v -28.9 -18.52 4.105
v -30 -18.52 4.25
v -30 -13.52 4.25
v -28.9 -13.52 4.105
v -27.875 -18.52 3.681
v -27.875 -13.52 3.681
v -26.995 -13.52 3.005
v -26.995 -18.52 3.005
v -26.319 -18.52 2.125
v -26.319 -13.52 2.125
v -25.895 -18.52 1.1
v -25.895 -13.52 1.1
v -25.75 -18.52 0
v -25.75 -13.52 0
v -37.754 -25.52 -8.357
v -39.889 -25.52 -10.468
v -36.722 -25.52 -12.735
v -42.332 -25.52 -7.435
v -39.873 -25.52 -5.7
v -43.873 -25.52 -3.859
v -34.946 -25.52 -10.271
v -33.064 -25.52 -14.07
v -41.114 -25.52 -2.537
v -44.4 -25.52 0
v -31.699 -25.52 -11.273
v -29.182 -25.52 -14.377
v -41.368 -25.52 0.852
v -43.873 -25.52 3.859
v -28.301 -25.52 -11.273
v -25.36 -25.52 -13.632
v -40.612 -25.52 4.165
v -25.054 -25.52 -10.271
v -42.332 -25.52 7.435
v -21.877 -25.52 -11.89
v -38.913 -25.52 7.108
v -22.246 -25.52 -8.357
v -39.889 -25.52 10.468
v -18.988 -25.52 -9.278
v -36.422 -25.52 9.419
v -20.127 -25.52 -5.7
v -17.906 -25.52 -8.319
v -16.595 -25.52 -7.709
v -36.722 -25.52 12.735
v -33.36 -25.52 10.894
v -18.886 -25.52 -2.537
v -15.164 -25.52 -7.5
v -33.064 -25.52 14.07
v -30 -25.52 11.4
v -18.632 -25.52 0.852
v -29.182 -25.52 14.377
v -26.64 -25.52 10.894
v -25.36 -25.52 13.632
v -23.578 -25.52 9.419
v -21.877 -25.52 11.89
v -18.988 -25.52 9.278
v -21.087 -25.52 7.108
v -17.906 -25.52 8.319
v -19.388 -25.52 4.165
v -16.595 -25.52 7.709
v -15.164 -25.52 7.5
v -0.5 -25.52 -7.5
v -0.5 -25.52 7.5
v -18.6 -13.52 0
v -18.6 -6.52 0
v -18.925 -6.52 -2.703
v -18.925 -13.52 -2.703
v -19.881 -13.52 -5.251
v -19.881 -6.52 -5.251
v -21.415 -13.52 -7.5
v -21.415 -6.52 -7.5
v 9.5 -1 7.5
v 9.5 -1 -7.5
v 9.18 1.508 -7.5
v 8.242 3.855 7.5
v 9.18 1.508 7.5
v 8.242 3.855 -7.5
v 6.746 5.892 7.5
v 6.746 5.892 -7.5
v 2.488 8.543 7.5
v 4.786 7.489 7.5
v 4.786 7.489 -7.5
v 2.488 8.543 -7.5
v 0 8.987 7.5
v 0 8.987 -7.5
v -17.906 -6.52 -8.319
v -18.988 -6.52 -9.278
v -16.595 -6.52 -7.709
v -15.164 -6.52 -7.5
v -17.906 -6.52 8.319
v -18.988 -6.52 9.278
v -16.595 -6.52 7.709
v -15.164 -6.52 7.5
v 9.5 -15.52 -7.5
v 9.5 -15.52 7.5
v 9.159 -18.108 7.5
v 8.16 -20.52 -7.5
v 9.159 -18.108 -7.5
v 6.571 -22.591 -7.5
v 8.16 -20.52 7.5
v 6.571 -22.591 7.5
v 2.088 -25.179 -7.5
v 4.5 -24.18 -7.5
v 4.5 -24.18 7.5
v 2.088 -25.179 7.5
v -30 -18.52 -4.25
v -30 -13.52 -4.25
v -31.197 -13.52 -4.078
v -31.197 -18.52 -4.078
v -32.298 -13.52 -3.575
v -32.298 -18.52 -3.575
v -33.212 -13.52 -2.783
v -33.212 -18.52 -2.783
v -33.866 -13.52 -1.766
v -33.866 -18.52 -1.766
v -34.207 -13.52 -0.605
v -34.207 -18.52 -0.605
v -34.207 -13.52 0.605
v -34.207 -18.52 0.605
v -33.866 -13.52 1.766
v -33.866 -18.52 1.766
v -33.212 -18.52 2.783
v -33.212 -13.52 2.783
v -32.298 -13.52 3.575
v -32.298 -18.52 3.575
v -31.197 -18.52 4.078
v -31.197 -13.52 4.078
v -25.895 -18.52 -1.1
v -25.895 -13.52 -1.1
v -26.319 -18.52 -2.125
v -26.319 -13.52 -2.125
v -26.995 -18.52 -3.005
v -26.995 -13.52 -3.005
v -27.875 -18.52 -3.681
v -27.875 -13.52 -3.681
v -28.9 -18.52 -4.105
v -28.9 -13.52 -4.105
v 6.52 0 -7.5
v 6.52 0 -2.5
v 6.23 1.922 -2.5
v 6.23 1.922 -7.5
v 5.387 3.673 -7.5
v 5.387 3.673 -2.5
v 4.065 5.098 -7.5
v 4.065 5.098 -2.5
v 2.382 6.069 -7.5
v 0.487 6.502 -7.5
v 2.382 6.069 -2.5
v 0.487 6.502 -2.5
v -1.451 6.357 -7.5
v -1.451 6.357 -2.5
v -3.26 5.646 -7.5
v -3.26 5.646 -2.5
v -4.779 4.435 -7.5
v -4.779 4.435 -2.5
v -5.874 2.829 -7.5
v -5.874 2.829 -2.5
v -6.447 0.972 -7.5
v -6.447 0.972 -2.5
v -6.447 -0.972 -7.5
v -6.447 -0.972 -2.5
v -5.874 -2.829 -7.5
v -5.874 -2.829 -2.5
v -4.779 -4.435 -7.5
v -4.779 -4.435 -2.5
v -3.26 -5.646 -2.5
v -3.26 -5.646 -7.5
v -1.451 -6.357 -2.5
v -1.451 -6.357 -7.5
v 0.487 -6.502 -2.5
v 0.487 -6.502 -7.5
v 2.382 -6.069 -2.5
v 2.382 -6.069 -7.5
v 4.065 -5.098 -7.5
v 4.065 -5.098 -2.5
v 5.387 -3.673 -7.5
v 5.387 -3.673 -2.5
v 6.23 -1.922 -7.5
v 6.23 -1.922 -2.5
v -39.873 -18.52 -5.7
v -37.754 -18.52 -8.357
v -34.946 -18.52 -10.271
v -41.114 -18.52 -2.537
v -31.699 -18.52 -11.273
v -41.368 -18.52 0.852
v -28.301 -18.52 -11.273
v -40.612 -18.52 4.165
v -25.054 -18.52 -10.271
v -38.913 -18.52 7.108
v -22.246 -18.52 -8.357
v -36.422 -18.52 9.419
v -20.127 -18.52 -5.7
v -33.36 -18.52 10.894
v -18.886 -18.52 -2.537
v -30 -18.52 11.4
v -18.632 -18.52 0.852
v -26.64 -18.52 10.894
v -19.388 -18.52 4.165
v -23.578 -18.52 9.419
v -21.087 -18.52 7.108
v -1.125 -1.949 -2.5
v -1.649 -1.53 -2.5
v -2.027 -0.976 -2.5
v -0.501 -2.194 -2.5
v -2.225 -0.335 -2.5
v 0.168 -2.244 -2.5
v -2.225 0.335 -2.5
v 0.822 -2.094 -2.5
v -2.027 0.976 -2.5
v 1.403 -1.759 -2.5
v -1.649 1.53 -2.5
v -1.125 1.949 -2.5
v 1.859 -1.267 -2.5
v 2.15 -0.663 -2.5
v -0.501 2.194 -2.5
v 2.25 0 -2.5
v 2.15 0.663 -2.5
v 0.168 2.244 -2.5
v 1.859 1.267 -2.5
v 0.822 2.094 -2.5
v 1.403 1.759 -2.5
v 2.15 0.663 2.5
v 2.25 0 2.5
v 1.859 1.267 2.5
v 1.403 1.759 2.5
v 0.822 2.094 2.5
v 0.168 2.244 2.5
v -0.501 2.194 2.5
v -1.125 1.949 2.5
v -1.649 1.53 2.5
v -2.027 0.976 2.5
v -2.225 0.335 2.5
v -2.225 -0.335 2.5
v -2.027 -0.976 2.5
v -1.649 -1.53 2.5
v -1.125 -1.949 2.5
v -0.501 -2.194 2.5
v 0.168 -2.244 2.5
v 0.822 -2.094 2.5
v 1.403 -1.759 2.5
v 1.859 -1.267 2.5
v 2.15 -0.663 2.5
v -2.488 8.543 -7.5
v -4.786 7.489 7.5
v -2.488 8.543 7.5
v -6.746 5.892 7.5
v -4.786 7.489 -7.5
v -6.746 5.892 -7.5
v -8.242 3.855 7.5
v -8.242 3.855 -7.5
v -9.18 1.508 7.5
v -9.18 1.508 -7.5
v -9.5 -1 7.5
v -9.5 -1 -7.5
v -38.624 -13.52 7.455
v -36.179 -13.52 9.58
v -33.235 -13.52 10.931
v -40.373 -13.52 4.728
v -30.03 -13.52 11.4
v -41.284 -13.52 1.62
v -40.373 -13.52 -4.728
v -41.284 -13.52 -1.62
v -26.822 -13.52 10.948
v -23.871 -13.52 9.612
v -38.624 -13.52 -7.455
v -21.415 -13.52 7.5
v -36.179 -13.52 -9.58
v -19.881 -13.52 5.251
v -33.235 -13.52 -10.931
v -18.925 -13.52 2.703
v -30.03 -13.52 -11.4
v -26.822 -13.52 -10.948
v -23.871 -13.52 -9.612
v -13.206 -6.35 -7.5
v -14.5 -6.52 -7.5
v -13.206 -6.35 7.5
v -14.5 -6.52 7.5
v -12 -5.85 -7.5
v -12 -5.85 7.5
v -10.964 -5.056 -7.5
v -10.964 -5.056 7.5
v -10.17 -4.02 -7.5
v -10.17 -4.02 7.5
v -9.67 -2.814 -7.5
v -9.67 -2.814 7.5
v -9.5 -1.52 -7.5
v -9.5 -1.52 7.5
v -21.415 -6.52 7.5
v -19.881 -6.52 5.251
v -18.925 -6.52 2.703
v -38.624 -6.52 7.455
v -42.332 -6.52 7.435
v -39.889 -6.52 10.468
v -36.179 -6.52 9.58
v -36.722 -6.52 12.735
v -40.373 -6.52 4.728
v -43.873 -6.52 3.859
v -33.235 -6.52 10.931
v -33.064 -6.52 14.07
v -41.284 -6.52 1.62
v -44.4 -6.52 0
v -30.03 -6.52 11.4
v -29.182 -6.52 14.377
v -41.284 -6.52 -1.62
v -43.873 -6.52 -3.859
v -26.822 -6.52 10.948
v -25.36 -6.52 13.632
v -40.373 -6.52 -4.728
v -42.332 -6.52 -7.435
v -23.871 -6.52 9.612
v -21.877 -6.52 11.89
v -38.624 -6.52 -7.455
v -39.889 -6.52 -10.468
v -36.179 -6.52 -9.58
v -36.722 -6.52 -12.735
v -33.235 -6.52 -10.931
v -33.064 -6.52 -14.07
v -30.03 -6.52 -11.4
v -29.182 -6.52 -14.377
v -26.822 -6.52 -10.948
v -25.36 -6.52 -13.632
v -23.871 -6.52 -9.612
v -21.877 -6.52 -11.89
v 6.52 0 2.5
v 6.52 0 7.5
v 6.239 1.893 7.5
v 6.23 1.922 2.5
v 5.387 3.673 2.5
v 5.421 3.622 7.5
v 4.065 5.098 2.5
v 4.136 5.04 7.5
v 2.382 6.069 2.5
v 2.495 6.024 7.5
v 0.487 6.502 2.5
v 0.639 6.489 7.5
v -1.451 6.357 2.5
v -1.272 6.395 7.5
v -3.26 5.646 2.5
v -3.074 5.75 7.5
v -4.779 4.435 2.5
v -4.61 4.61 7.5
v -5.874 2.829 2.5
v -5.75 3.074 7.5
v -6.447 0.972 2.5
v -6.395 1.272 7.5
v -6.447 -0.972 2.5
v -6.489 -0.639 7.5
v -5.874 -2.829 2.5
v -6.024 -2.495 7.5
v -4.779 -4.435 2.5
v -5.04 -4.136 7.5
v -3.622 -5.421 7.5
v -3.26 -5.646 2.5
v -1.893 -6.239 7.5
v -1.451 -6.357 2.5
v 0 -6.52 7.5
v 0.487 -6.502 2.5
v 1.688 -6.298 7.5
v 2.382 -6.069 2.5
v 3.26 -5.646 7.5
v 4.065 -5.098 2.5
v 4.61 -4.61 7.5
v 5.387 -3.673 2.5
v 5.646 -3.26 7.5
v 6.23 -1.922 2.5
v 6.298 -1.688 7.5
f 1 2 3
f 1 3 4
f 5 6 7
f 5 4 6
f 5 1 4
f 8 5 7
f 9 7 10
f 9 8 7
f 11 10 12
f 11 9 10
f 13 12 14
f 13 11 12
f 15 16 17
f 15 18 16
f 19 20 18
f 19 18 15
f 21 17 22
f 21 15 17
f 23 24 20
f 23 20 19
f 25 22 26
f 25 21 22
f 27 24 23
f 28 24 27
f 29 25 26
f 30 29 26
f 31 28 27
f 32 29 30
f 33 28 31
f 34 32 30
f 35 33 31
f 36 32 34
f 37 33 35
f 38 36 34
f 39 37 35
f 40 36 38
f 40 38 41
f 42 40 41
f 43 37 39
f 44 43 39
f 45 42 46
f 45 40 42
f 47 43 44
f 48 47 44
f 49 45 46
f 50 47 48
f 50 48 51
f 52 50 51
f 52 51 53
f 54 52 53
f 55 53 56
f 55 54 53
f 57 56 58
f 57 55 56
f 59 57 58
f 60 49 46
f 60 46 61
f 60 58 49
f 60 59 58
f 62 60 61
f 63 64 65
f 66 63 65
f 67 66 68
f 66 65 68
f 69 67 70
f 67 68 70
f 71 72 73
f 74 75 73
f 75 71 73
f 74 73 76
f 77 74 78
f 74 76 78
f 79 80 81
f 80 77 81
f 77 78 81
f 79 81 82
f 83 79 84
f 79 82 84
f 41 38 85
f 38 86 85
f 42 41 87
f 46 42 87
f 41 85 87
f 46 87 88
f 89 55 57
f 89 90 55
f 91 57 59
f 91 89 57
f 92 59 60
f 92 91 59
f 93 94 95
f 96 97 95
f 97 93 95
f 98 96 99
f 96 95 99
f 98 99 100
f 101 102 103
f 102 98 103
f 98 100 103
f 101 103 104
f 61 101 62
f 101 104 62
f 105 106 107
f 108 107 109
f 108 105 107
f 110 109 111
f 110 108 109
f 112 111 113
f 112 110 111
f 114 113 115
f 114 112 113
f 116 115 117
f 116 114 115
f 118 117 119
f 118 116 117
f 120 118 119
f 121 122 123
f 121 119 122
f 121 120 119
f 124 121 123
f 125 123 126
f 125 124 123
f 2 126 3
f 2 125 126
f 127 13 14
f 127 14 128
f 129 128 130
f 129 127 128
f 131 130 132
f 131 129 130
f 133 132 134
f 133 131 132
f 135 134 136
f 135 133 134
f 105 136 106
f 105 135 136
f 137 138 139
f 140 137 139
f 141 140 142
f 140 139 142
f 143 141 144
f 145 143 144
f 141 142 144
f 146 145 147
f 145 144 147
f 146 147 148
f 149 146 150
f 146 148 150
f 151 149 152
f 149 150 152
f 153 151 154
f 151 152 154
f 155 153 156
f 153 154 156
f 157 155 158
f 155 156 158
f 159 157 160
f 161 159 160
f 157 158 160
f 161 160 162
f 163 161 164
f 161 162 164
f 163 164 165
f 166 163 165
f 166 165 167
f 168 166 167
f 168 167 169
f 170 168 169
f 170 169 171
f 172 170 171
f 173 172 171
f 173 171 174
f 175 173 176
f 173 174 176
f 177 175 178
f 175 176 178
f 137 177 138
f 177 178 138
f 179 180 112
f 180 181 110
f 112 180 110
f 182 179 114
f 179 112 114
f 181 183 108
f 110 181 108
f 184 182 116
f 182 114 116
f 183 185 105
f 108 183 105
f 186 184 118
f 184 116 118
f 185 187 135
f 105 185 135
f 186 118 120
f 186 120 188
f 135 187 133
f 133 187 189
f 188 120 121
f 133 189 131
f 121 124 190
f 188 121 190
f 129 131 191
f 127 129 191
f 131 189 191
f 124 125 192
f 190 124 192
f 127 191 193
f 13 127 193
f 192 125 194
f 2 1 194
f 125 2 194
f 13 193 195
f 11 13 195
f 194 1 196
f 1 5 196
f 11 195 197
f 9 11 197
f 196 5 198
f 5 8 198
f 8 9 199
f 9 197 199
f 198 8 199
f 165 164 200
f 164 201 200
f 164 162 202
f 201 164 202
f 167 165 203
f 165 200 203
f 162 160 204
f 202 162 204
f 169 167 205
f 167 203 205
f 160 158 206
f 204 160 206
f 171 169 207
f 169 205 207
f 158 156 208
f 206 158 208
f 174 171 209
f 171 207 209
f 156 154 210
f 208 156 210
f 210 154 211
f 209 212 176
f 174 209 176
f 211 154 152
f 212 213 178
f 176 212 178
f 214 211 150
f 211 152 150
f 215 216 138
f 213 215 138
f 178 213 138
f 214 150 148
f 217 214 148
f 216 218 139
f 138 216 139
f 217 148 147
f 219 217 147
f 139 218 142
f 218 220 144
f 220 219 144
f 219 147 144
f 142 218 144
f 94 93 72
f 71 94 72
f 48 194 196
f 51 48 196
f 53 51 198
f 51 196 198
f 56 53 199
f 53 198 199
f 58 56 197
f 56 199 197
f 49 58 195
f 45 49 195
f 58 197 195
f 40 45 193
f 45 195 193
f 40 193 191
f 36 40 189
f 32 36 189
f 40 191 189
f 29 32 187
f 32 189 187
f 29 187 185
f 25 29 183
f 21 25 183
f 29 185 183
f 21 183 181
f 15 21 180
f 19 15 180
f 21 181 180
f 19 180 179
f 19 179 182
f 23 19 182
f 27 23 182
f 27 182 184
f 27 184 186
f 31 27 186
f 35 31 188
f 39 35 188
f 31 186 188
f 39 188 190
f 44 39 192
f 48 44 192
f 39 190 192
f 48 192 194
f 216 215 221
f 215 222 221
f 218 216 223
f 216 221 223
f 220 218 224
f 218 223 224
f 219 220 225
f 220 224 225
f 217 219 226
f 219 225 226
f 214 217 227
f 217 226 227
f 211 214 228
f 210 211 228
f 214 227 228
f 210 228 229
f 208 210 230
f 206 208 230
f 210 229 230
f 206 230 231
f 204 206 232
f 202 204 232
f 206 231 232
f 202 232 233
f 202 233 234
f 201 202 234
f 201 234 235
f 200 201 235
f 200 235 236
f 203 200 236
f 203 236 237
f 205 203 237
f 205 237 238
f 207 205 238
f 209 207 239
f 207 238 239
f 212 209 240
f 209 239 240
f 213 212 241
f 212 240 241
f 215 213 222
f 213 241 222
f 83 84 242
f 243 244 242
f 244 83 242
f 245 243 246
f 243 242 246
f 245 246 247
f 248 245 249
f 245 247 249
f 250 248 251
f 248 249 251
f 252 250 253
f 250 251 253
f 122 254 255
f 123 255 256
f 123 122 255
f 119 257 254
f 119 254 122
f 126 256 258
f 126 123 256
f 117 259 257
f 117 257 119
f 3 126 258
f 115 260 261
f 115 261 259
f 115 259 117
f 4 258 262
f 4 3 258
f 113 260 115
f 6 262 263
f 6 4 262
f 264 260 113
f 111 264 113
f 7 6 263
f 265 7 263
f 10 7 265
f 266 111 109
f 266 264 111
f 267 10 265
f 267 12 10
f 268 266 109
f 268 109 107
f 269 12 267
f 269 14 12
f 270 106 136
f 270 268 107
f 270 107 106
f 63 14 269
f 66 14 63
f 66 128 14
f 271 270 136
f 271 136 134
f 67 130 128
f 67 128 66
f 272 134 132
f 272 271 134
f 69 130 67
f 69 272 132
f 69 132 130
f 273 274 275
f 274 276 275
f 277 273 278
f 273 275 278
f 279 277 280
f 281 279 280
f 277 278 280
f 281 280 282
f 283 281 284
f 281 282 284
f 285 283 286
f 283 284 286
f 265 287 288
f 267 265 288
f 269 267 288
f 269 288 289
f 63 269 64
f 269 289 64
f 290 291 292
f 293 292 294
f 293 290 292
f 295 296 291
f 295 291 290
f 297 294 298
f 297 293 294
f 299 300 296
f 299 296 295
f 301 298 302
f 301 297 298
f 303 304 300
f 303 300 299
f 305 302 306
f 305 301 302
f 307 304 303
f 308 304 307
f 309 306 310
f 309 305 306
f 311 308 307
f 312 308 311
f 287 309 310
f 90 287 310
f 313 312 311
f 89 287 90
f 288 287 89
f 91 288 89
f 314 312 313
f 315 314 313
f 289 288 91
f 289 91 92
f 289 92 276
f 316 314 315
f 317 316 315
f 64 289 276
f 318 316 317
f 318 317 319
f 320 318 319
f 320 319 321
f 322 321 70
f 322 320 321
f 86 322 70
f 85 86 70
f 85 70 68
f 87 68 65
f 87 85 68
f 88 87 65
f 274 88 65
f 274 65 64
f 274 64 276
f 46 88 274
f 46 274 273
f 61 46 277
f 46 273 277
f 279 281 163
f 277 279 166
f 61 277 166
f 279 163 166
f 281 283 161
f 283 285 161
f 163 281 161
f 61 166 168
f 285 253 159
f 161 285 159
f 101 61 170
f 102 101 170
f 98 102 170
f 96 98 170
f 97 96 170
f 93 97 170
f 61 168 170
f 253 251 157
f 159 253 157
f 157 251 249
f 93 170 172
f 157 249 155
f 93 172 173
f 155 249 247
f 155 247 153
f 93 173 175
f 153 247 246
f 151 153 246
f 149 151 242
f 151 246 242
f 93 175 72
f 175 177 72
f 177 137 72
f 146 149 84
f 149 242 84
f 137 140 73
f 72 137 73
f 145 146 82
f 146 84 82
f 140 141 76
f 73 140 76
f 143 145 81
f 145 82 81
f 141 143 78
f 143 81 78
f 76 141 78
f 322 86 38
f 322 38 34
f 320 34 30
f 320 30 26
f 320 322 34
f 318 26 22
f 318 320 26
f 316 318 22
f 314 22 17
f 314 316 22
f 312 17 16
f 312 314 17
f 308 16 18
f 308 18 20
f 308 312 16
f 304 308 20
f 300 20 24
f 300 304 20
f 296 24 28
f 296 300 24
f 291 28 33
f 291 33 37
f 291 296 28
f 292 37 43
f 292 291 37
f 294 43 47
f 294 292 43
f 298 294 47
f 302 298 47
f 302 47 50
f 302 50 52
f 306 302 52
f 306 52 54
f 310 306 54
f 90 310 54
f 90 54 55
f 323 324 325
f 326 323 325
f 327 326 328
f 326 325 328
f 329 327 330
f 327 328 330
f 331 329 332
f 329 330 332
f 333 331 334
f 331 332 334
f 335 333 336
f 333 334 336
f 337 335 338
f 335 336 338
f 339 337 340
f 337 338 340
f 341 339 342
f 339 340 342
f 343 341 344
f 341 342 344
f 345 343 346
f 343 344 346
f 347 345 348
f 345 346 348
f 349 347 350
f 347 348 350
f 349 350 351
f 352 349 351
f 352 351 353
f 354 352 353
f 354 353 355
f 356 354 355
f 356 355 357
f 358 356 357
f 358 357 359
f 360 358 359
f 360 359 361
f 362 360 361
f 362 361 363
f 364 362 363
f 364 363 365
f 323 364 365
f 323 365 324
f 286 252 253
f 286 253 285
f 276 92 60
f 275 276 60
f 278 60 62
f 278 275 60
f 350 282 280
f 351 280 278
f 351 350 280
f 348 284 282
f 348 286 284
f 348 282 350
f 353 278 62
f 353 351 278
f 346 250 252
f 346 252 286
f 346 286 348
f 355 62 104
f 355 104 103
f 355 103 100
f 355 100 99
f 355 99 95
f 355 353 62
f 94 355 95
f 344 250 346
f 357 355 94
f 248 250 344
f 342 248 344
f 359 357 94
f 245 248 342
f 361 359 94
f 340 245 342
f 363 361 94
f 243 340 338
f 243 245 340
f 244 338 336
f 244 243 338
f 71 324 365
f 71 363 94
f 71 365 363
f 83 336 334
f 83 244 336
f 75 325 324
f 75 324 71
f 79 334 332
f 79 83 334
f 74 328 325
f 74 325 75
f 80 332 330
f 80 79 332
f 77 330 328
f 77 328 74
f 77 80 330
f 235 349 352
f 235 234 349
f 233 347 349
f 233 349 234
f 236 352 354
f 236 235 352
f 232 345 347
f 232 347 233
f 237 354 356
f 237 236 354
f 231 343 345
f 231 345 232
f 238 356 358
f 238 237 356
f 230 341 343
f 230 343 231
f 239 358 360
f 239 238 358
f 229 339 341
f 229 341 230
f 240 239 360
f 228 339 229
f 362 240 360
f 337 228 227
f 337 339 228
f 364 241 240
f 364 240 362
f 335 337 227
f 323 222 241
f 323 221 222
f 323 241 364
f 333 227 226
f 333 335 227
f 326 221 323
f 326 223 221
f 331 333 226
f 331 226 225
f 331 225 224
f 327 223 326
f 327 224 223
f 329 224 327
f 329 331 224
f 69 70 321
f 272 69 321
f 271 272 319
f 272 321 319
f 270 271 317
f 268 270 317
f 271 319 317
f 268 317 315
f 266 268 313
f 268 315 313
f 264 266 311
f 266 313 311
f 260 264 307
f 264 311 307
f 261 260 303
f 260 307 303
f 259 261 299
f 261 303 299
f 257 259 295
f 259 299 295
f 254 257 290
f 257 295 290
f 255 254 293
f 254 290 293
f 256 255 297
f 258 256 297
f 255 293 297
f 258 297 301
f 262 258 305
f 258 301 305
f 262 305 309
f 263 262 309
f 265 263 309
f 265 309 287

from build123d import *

# Parameters (mm, degrees)
SKETCH1_R               = 6.52
SKETCH1_R_2             = 2.25
BOSS_EXTRUDE1_DEPTH     = 7.5
CUT_EXTRUDE1_START      = 7.5
SKETCH1_3_R             = 6.52
CUT_EXTRUDE1_DEPTH      = 5
CUT_EXTRUDE2_START      = -2.5
SKETCH1_4_R             = 6.52
CUT_EXTRUDE2_DEPTH      = 5
SKETCH2_R               = 14.4
BOSS_EXTRUDE2_DEPTH     = 19
CUT_EXTRUDE3_DEPTH      = 51.395634732
CUT_EXTRUDE3_DEPTH_BACK = 51.395634732
CUT_EXTRUDE4_DEPTH      = 7
CUT_EXTRUDE5_START      = -12
SKETCH2_5_R             = 11.4
CUT_EXTRUDE5_DEPTH      = 7
FILLET1_R               = 5
FILLET2_R               = 10


with BuildPart() as part:
    # Sketch1 → Boss-Extrude1 (new, symmetric)
    # profile 1 of 3: a face of its own
    with BuildSketch(Plane.XY):
        Polygon((-4.7e-08, -6.52), (-9.5, -6.52), (-16.20264212, -6.52), (-30, -6.52), (-30, -25.52), (9.5, -25.52), (9.5, -6.52), align=None)
    # profile 2 of 3: a face of its own
    with BuildSketch(Plane.XY):
        Polygon((9.5, 9), (-9.5, 9), (-9.5, -6.52), (-4.7e-08, -6.52), (9.5, -6.52), align=None)
        with BuildLine():
            ThreePointArc((6.52, 0), (4.610336197, -4.61033623), (-4.7e-08, -6.52))
            ThreePointArc((-4.7e-08, -6.52), (-4.610336197, 4.61033623), (6.52, 0))
        make_face(mode=Mode.SUBTRACT)
    # profile 3 of 3: a face of its own
    with BuildSketch(Plane.XY):
        Circle(SKETCH1_R)
        Circle(SKETCH1_R_2, mode=Mode.SUBTRACT)
    extrude(amount=BOSS_EXTRUDE1_DEPTH, both=True)

    # Sketch1<3> → Cut-Extrude1 (cut)
    with BuildSketch(Plane.XY.offset(CUT_EXTRUDE1_START)):
        Circle(SKETCH1_3_R)
    extrude(amount=-CUT_EXTRUDE1_DEPTH, mode=Mode.SUBTRACT)

    # Sketch1<4> → Cut-Extrude2 (cut)
    with BuildSketch(Plane.XY.offset(CUT_EXTRUDE2_START)):
        Circle(SKETCH1_4_R)
    extrude(amount=-CUT_EXTRUDE2_DEPTH, mode=Mode.SUBTRACT)

    # Sketch2 → Boss-Extrude2 (add, through all)
    with BuildSketch(Plane(origin=(0, -6.52, 0), x_dir=(1, 0, 0), z_dir=(0, 1, 0))):
        with Locations((-30, 0)):
            Circle(SKETCH2_R)
    extrude(amount=-BOSS_EXTRUDE2_DEPTH)

    # Sketch2<3> → Cut-Extrude3 (cut, two sides: drawn at the far end of the back side and taken through both)
    with BuildSketch(Plane(origin=(0, -6.52, 0), x_dir=(1, 0, 0), z_dir=(0, 1, 0)).offset(-CUT_EXTRUDE3_DEPTH_BACK)):
        with BuildLine():
            ThreePointArc((-30, -4.25), (-26.99479618, -3.00520382), (-25.75, 0))
            ThreePointArc((-25.75, 0), (-26.99479618, 3.00520382), (-30, 4.25))
            Line((-30, 4.25), (-30, -4.25))
        make_face()
        with BuildLine():
            Line((-30, -4.25), (-30, 4.25))
            ThreePointArc((-30, 4.25), (-34.25, 0), (-30, -4.25))
        make_face()
    extrude(amount=CUT_EXTRUDE3_DEPTH + CUT_EXTRUDE3_DEPTH_BACK, mode=Mode.SUBTRACT)

    # Sketch2<4> → Cut-Extrude4 (cut)
    with BuildSketch(Plane(origin=(0, -6.52, 0), x_dir=(1, 0, 0), z_dir=(0, 1, 0))):
        with BuildLine():
            ThreePointArc((-21.414547187, -7.5), (-19.326805491, -4.005361278), (-18.6, 0))
            ThreePointArc((-18.6, 0), (-19.326805491, 4.005361278), (-21.414547187, 7.5))
            Line((-21.414547187, 7.5), (-30, 7.5))
            Line((-30, 7.5), (-30, 4.25))
            ThreePointArc((-30, 4.25), (-26.99479618, 3.00520382), (-25.75, 0))
            ThreePointArc((-25.75, 0), (-26.99479618, -3.00520382), (-30, -4.25))
            Line((-30, -4.25), (-30, -7.5))
            Line((-30, -7.5), (-21.414547187, -7.5))
        make_face()
        with BuildLine():
            Line((-30, 7.5), (-21.414547187, 7.5))
            ThreePointArc((-21.414547187, 7.5), (-41.4, 0), (-21.414547187, -7.5))
            Line((-21.414547187, -7.5), (-30, -7.5))
            Line((-30, -7.5), (-30, -4.25))
            ThreePointArc((-30, -4.25), (-34.25, 0), (-30, 4.25))
            Line((-30, 4.25), (-30, 7.5))
        make_face()
    extrude(amount=-CUT_EXTRUDE4_DEPTH, mode=Mode.SUBTRACT)

    # Sketch2<5> → Cut-Extrude5 (cut)
    with BuildSketch(Plane(origin=(0, -6.52, 0), x_dir=(1, 0, 0), z_dir=(0, 1, 0)).offset(CUT_EXTRUDE5_START)):
        with Locations(Location((-30, 0, 0), (0, 0, 270))):
            Circle(SKETCH2_5_R)
    extrude(amount=-CUT_EXTRUDE5_DEPTH, mode=Mode.SUBTRACT)

    # Fillet1
    fillet1_edges = [part.edges().sort_by_distance(p)[0] for p in [
        (-9.5, -6.52, 0),
        (-17.707319251, -16.02, -7.5),
        (-17.707319251, -16.02, 7.5),
    ]]
    fillet(fillet1_edges, radius=FILLET1_R)

    # Fillet2
    # the kernel refuses this fillet: 10 mm, written as the material it takes off along each edge
    with BuildSketch(Plane(origin=(-9.5, 9, -32.5), x_dir=(0, -1, 0), z_dir=(0, 0, 1)), Plane(origin=(9.5, 9, -32.5), x_dir=(-1, 0, 0), z_dir=(0, 0, 1)), Plane(origin=(9.5, -25.52, 32.5), x_dir=(-1, 0, 0), z_dir=(0, 0, -1))) as fillet2_piece_1:
        with BuildLine():
            CenterArc((FILLET2_R, FILLET2_R), FILLET2_R, 180, 90)
            Line((0, FILLET2_R), (0, 0))
            Line((0, 0), (FILLET2_R, 0))
        make_face()
    extrude(amount=65, mode=Mode.SUBTRACT)


solid = part.part
